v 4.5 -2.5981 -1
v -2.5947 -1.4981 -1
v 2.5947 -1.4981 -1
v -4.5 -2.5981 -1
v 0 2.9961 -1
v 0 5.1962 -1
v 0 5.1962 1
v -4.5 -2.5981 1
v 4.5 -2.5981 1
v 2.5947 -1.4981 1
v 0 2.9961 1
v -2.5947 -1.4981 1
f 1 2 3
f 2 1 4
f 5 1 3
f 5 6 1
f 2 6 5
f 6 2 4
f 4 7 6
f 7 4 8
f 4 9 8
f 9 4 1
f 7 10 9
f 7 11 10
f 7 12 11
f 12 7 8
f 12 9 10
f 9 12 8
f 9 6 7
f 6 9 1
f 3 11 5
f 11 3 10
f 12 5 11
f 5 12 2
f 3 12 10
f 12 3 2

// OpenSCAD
module triplicate(s) {
	for (i = [0:2]) rotate([0,0,120*i]) translate([-s/3,0])
		rotate([0,0,60]) translate([s/6,0]) child(0);
}

module flakeSide(s) {
	polygon(points = [[-s/2, 0], [0, -sqrt(3)*s/6], [s/2, 0]]);
}

module flake0Body(s, n, rs, c) {
	if ((s - 6*n*(2*rs + c)/sqrt(3)) > 0)
		triplicate(s - 6*n*(2*rs + c)/sqrt(3))
			flakeSide(s - 6*n*(2*rs + c)/sqrt(3));
	else cube([2,2,2], center = true);	/* just an error case */
}

translate([0,0]) difference() {
	linear_extrude(height=2.0, center=true) flake0Body(9,0,1/2,1/10);
	linear_extrude(height=3.0, center=true) flake0Body(9,1,1/2,1/10);
}
